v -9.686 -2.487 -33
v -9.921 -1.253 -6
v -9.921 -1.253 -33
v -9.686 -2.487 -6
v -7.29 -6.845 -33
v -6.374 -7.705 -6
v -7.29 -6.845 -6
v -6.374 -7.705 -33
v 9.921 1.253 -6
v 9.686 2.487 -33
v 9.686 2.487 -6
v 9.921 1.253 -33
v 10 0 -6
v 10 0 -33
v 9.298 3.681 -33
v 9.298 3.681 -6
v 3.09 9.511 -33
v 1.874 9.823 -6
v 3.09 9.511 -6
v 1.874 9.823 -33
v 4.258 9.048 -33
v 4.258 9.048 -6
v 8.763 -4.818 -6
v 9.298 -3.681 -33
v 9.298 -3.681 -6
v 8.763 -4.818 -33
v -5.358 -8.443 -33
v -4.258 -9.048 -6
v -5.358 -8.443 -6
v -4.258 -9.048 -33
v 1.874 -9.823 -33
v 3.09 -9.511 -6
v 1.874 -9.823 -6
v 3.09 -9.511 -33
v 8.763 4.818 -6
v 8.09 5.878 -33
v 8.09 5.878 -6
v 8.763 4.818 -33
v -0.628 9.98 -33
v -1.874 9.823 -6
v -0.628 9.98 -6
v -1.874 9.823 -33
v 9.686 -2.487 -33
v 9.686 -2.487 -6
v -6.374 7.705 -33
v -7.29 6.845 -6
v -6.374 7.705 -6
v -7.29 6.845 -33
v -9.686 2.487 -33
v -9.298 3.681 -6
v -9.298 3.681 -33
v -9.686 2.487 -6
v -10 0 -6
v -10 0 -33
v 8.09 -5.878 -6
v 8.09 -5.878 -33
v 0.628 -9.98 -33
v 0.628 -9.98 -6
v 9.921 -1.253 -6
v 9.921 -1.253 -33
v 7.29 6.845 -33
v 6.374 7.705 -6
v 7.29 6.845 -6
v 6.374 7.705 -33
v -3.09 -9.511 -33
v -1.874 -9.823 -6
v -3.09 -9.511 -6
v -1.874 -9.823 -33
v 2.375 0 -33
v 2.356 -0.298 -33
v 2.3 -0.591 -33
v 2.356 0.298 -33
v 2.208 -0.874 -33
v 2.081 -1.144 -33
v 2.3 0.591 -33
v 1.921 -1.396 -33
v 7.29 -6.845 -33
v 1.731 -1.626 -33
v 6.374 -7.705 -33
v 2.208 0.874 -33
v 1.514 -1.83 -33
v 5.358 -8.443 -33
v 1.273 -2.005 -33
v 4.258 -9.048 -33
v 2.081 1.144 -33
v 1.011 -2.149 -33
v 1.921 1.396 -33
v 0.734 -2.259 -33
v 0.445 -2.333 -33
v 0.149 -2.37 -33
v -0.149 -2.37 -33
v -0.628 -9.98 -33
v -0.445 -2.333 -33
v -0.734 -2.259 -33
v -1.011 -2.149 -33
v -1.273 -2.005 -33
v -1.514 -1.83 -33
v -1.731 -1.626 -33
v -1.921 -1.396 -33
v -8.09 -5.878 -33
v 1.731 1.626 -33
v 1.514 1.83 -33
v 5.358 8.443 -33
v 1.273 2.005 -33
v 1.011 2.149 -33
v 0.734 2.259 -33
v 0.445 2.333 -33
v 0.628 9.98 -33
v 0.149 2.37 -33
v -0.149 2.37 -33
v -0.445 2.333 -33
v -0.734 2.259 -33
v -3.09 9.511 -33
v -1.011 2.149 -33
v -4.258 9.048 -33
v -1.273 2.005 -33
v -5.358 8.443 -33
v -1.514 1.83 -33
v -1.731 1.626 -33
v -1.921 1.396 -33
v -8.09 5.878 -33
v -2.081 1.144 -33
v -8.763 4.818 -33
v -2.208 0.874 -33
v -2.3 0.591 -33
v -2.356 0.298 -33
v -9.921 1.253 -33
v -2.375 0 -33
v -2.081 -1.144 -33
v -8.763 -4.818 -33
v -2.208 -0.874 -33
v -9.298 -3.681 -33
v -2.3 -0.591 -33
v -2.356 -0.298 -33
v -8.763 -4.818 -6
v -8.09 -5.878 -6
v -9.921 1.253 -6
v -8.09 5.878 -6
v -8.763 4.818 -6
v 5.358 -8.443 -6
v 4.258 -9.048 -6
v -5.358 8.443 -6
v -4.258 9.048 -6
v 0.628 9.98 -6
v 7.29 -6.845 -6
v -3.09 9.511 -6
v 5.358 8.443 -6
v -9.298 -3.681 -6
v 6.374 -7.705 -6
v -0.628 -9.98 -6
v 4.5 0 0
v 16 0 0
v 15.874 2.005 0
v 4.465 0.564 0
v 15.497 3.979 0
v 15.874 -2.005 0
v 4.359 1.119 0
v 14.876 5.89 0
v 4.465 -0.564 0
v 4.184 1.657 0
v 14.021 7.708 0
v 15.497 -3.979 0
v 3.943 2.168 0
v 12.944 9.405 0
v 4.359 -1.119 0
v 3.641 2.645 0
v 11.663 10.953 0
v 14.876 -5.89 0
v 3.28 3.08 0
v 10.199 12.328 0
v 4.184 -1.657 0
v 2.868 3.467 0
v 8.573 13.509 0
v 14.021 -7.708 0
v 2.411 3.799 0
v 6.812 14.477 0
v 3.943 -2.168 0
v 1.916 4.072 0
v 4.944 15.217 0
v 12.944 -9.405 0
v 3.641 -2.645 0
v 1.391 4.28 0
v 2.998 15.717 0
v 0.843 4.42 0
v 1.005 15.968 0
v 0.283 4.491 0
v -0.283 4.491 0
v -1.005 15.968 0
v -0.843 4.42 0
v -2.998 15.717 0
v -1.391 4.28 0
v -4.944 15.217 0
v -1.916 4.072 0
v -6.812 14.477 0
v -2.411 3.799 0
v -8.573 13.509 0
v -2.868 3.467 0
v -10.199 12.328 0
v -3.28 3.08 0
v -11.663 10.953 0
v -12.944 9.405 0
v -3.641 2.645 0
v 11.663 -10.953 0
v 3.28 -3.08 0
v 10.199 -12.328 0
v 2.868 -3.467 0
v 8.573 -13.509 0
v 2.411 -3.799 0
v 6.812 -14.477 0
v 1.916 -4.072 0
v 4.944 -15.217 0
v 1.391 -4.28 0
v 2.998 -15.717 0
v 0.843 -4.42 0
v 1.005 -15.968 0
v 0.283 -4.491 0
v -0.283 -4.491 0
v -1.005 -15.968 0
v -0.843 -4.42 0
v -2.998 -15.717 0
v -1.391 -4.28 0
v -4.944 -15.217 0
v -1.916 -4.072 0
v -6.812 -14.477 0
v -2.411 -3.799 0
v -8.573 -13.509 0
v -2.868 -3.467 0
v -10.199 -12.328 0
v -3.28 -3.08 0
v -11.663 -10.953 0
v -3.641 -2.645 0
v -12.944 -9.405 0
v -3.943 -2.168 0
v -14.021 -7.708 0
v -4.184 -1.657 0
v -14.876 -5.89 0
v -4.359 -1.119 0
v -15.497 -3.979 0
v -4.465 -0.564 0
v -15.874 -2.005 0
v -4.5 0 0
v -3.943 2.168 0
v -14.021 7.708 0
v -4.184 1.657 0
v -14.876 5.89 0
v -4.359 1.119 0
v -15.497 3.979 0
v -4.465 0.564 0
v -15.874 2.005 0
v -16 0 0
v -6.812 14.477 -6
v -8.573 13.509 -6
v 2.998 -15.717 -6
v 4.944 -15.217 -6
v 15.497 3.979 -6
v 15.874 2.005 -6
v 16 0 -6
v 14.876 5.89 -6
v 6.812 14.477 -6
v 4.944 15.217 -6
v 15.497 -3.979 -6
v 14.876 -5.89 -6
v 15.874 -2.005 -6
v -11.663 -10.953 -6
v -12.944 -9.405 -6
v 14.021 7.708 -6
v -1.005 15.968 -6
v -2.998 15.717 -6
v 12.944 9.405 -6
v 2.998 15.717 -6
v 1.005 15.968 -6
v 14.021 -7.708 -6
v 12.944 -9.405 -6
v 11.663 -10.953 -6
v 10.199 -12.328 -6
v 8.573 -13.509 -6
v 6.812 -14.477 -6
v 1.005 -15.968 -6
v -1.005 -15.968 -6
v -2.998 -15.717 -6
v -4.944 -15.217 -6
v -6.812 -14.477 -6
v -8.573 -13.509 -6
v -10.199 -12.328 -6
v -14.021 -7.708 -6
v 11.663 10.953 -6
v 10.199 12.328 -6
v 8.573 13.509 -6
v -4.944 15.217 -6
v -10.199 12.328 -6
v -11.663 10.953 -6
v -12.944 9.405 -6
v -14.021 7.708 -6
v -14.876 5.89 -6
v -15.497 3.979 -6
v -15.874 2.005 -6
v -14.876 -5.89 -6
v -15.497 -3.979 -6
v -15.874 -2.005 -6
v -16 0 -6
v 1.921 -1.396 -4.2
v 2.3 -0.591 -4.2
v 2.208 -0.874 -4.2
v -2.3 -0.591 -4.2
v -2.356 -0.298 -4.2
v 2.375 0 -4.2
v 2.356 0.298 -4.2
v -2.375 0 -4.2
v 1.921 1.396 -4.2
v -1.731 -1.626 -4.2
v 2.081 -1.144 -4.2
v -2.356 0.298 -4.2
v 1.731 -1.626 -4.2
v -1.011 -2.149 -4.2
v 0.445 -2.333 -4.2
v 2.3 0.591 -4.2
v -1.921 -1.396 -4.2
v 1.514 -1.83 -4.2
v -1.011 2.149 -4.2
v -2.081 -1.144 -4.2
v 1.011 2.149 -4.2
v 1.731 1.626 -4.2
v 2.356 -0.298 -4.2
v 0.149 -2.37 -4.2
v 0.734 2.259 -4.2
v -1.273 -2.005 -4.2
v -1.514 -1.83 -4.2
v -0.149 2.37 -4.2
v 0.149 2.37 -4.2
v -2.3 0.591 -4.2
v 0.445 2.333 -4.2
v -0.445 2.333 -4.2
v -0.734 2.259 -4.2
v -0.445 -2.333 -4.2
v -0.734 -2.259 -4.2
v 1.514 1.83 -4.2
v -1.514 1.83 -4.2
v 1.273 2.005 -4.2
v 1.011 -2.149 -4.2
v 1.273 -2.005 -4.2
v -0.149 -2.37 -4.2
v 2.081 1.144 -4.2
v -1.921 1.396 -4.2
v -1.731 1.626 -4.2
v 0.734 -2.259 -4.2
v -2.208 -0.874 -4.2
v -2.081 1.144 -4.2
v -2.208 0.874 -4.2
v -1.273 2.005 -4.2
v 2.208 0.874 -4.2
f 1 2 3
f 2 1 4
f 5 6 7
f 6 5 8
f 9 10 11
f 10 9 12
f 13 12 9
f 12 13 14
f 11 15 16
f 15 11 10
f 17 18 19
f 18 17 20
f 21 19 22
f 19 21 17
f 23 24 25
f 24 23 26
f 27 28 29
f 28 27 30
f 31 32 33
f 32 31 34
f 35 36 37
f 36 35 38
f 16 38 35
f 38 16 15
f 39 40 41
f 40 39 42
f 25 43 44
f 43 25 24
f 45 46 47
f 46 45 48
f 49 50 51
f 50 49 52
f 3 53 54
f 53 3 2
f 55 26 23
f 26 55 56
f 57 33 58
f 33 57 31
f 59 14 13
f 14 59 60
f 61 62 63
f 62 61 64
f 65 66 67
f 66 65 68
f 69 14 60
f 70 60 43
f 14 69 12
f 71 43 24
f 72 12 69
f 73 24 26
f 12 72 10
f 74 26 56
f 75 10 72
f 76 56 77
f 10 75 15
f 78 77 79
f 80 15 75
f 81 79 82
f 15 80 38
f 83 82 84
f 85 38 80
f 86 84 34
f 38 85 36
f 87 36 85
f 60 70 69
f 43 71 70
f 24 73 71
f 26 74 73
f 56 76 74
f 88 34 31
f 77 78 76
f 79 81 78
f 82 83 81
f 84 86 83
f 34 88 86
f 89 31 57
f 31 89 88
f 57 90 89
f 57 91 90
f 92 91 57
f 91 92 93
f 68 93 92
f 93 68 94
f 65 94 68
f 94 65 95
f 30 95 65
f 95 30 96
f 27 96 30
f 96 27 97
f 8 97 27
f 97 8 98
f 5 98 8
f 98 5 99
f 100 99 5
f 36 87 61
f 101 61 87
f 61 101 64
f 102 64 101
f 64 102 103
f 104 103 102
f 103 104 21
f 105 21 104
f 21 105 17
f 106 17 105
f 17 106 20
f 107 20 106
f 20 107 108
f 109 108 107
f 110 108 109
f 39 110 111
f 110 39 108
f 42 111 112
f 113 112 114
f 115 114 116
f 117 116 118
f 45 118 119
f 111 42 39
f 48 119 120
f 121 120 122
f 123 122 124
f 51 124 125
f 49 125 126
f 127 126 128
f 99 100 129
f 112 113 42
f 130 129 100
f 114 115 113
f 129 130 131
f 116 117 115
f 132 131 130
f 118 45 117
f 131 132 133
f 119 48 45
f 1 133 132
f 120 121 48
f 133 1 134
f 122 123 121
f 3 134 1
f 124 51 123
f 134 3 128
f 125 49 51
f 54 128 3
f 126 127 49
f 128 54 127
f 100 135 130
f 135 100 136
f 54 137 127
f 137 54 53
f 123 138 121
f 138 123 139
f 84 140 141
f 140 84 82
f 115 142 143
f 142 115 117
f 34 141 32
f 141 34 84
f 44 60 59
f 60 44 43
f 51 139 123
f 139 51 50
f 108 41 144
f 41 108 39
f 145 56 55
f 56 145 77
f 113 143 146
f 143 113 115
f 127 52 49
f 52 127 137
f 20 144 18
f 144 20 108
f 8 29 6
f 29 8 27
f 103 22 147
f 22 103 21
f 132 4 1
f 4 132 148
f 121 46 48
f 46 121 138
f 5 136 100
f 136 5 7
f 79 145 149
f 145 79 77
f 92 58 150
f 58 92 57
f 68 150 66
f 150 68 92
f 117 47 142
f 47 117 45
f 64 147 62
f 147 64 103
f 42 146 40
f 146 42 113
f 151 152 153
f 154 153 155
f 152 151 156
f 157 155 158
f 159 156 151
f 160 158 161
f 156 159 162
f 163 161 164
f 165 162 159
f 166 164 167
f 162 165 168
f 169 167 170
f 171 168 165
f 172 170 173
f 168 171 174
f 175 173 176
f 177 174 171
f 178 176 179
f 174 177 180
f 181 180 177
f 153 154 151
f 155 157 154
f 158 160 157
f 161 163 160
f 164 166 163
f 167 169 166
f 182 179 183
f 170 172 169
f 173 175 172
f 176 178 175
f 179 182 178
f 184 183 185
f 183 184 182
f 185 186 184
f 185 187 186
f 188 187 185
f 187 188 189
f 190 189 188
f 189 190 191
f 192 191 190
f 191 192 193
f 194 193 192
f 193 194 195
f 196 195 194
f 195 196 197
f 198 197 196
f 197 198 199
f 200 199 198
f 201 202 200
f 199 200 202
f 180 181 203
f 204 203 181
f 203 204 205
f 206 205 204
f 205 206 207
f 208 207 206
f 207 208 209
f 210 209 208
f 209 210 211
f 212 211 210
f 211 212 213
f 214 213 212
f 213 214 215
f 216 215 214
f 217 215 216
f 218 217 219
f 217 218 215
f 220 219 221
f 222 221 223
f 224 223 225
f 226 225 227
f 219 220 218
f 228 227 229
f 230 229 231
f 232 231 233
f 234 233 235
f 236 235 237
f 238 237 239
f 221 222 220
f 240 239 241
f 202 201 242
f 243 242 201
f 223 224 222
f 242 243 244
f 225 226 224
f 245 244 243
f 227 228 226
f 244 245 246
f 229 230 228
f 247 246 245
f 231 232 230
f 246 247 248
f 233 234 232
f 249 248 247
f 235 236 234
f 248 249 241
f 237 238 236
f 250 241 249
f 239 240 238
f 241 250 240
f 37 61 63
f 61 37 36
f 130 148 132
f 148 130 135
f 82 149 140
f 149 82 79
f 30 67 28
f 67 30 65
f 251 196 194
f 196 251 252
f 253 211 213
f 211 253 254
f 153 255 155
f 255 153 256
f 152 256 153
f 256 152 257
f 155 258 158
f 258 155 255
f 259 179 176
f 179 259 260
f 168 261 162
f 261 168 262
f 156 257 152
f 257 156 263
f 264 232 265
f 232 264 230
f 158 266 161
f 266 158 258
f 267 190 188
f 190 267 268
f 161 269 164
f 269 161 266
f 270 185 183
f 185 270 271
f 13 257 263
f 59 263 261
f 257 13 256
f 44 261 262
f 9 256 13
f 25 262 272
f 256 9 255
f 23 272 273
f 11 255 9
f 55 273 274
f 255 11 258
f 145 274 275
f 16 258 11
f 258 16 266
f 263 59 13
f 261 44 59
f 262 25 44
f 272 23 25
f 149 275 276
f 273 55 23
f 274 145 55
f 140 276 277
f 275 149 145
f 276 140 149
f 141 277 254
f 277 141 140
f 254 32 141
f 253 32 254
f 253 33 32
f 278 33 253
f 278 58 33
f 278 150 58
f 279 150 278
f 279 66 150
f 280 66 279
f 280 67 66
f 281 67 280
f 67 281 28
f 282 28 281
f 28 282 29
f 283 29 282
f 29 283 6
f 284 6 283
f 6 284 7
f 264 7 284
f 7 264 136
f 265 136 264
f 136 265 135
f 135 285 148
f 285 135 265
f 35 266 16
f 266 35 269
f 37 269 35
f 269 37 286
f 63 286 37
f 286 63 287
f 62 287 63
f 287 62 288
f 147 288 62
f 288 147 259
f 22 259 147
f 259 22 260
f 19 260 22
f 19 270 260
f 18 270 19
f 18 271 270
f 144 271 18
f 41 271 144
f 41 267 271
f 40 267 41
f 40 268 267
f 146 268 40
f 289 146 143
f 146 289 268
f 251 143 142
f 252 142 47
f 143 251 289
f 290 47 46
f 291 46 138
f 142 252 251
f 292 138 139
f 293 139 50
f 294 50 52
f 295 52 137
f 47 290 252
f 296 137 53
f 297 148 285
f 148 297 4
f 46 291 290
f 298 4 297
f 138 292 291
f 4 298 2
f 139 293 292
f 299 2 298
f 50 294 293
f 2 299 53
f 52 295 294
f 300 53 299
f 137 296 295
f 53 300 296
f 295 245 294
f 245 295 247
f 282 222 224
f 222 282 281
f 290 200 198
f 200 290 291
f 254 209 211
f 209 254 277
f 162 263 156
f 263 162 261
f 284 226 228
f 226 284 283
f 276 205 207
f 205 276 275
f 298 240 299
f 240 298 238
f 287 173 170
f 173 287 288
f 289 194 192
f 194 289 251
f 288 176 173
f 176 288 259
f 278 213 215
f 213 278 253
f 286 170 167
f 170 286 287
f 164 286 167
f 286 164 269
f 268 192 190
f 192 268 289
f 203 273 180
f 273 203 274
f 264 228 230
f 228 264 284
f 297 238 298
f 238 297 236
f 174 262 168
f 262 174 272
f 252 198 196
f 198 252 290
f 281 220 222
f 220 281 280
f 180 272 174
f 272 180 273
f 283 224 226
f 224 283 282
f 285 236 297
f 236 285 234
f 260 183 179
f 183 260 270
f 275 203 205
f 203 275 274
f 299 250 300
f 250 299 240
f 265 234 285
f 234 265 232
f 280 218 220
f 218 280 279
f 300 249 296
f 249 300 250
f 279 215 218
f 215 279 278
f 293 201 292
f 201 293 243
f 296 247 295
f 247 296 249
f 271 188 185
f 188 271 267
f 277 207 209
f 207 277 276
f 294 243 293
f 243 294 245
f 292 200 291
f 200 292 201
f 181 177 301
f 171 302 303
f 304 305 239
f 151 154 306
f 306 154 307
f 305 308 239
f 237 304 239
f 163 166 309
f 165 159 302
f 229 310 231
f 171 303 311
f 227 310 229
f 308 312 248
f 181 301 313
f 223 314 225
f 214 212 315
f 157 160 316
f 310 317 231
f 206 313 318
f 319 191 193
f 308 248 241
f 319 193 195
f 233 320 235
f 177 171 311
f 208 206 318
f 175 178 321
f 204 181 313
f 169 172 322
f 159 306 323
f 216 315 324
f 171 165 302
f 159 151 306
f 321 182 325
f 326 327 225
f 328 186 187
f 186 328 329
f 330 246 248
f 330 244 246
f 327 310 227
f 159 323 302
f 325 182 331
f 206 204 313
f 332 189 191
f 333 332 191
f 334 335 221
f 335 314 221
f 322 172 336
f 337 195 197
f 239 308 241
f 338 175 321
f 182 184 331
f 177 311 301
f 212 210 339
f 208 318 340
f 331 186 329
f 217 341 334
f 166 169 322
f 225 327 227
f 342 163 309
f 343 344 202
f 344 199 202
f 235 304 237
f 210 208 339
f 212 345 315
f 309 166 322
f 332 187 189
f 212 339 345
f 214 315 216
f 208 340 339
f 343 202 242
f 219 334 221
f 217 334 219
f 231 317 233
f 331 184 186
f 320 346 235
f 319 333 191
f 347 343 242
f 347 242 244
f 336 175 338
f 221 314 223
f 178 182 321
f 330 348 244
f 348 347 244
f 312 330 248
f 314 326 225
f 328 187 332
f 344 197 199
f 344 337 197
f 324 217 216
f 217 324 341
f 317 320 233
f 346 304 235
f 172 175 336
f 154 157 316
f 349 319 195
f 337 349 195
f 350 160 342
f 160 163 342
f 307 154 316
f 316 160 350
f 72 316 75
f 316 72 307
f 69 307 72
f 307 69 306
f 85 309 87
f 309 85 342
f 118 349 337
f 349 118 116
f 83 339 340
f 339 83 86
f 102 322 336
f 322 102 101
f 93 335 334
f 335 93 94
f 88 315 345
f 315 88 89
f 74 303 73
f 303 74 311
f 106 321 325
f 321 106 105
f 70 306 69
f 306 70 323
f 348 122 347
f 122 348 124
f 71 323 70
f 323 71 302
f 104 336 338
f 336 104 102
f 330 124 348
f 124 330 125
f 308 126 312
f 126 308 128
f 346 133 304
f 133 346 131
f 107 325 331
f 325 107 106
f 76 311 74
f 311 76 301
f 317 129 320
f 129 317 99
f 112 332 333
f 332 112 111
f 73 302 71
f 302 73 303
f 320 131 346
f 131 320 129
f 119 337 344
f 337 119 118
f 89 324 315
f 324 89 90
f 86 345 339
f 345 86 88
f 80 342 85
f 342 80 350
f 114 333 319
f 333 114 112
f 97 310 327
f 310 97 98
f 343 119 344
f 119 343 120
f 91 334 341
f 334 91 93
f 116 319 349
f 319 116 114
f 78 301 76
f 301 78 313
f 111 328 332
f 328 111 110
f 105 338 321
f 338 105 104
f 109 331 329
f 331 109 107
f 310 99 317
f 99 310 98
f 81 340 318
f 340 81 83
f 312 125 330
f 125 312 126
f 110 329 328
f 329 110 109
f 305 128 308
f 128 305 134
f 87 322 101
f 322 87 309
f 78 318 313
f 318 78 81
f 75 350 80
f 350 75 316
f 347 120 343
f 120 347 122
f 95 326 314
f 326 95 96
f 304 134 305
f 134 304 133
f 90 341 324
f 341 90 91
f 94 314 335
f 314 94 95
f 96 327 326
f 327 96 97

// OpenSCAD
$fn = 50;


difference() {
	union() {
		translate(v = [0, 0, -33.0000000000]) {
			cylinder(h = 33, r = 10.0000000000);
		}
		translate(v = [0, 0, -6.0000000000]) {
			cylinder(h = 6, r = 16.0000000000);
		}
	}
	union() {
		translate(v = [0, 0, 0]) {
			rotate(a = [0, 0, 0]) {
				difference() {
					union() {
						#translate(v = [0, 0, -33.0000000000]) {
							cylinder(h = 33, r = 2.2500000000);
						}
						#translate(v = [0, 0, -4.2000000000]) {
							cylinder(h = 4.2000000000, r1 = 2.3750000000, r2 = 4.5000000000);
						}
						#translate(v = [0, 0, -33.0000000000]) {
							cylinder(h = 33, r = 2.3750000000);
						}
						#translate(v = [0, 0, -33.0000000000]) {
							cylinder(h = 33, r = 2.2500000000);
						}
					}
					union();
				}
			}
		}
	}
}
